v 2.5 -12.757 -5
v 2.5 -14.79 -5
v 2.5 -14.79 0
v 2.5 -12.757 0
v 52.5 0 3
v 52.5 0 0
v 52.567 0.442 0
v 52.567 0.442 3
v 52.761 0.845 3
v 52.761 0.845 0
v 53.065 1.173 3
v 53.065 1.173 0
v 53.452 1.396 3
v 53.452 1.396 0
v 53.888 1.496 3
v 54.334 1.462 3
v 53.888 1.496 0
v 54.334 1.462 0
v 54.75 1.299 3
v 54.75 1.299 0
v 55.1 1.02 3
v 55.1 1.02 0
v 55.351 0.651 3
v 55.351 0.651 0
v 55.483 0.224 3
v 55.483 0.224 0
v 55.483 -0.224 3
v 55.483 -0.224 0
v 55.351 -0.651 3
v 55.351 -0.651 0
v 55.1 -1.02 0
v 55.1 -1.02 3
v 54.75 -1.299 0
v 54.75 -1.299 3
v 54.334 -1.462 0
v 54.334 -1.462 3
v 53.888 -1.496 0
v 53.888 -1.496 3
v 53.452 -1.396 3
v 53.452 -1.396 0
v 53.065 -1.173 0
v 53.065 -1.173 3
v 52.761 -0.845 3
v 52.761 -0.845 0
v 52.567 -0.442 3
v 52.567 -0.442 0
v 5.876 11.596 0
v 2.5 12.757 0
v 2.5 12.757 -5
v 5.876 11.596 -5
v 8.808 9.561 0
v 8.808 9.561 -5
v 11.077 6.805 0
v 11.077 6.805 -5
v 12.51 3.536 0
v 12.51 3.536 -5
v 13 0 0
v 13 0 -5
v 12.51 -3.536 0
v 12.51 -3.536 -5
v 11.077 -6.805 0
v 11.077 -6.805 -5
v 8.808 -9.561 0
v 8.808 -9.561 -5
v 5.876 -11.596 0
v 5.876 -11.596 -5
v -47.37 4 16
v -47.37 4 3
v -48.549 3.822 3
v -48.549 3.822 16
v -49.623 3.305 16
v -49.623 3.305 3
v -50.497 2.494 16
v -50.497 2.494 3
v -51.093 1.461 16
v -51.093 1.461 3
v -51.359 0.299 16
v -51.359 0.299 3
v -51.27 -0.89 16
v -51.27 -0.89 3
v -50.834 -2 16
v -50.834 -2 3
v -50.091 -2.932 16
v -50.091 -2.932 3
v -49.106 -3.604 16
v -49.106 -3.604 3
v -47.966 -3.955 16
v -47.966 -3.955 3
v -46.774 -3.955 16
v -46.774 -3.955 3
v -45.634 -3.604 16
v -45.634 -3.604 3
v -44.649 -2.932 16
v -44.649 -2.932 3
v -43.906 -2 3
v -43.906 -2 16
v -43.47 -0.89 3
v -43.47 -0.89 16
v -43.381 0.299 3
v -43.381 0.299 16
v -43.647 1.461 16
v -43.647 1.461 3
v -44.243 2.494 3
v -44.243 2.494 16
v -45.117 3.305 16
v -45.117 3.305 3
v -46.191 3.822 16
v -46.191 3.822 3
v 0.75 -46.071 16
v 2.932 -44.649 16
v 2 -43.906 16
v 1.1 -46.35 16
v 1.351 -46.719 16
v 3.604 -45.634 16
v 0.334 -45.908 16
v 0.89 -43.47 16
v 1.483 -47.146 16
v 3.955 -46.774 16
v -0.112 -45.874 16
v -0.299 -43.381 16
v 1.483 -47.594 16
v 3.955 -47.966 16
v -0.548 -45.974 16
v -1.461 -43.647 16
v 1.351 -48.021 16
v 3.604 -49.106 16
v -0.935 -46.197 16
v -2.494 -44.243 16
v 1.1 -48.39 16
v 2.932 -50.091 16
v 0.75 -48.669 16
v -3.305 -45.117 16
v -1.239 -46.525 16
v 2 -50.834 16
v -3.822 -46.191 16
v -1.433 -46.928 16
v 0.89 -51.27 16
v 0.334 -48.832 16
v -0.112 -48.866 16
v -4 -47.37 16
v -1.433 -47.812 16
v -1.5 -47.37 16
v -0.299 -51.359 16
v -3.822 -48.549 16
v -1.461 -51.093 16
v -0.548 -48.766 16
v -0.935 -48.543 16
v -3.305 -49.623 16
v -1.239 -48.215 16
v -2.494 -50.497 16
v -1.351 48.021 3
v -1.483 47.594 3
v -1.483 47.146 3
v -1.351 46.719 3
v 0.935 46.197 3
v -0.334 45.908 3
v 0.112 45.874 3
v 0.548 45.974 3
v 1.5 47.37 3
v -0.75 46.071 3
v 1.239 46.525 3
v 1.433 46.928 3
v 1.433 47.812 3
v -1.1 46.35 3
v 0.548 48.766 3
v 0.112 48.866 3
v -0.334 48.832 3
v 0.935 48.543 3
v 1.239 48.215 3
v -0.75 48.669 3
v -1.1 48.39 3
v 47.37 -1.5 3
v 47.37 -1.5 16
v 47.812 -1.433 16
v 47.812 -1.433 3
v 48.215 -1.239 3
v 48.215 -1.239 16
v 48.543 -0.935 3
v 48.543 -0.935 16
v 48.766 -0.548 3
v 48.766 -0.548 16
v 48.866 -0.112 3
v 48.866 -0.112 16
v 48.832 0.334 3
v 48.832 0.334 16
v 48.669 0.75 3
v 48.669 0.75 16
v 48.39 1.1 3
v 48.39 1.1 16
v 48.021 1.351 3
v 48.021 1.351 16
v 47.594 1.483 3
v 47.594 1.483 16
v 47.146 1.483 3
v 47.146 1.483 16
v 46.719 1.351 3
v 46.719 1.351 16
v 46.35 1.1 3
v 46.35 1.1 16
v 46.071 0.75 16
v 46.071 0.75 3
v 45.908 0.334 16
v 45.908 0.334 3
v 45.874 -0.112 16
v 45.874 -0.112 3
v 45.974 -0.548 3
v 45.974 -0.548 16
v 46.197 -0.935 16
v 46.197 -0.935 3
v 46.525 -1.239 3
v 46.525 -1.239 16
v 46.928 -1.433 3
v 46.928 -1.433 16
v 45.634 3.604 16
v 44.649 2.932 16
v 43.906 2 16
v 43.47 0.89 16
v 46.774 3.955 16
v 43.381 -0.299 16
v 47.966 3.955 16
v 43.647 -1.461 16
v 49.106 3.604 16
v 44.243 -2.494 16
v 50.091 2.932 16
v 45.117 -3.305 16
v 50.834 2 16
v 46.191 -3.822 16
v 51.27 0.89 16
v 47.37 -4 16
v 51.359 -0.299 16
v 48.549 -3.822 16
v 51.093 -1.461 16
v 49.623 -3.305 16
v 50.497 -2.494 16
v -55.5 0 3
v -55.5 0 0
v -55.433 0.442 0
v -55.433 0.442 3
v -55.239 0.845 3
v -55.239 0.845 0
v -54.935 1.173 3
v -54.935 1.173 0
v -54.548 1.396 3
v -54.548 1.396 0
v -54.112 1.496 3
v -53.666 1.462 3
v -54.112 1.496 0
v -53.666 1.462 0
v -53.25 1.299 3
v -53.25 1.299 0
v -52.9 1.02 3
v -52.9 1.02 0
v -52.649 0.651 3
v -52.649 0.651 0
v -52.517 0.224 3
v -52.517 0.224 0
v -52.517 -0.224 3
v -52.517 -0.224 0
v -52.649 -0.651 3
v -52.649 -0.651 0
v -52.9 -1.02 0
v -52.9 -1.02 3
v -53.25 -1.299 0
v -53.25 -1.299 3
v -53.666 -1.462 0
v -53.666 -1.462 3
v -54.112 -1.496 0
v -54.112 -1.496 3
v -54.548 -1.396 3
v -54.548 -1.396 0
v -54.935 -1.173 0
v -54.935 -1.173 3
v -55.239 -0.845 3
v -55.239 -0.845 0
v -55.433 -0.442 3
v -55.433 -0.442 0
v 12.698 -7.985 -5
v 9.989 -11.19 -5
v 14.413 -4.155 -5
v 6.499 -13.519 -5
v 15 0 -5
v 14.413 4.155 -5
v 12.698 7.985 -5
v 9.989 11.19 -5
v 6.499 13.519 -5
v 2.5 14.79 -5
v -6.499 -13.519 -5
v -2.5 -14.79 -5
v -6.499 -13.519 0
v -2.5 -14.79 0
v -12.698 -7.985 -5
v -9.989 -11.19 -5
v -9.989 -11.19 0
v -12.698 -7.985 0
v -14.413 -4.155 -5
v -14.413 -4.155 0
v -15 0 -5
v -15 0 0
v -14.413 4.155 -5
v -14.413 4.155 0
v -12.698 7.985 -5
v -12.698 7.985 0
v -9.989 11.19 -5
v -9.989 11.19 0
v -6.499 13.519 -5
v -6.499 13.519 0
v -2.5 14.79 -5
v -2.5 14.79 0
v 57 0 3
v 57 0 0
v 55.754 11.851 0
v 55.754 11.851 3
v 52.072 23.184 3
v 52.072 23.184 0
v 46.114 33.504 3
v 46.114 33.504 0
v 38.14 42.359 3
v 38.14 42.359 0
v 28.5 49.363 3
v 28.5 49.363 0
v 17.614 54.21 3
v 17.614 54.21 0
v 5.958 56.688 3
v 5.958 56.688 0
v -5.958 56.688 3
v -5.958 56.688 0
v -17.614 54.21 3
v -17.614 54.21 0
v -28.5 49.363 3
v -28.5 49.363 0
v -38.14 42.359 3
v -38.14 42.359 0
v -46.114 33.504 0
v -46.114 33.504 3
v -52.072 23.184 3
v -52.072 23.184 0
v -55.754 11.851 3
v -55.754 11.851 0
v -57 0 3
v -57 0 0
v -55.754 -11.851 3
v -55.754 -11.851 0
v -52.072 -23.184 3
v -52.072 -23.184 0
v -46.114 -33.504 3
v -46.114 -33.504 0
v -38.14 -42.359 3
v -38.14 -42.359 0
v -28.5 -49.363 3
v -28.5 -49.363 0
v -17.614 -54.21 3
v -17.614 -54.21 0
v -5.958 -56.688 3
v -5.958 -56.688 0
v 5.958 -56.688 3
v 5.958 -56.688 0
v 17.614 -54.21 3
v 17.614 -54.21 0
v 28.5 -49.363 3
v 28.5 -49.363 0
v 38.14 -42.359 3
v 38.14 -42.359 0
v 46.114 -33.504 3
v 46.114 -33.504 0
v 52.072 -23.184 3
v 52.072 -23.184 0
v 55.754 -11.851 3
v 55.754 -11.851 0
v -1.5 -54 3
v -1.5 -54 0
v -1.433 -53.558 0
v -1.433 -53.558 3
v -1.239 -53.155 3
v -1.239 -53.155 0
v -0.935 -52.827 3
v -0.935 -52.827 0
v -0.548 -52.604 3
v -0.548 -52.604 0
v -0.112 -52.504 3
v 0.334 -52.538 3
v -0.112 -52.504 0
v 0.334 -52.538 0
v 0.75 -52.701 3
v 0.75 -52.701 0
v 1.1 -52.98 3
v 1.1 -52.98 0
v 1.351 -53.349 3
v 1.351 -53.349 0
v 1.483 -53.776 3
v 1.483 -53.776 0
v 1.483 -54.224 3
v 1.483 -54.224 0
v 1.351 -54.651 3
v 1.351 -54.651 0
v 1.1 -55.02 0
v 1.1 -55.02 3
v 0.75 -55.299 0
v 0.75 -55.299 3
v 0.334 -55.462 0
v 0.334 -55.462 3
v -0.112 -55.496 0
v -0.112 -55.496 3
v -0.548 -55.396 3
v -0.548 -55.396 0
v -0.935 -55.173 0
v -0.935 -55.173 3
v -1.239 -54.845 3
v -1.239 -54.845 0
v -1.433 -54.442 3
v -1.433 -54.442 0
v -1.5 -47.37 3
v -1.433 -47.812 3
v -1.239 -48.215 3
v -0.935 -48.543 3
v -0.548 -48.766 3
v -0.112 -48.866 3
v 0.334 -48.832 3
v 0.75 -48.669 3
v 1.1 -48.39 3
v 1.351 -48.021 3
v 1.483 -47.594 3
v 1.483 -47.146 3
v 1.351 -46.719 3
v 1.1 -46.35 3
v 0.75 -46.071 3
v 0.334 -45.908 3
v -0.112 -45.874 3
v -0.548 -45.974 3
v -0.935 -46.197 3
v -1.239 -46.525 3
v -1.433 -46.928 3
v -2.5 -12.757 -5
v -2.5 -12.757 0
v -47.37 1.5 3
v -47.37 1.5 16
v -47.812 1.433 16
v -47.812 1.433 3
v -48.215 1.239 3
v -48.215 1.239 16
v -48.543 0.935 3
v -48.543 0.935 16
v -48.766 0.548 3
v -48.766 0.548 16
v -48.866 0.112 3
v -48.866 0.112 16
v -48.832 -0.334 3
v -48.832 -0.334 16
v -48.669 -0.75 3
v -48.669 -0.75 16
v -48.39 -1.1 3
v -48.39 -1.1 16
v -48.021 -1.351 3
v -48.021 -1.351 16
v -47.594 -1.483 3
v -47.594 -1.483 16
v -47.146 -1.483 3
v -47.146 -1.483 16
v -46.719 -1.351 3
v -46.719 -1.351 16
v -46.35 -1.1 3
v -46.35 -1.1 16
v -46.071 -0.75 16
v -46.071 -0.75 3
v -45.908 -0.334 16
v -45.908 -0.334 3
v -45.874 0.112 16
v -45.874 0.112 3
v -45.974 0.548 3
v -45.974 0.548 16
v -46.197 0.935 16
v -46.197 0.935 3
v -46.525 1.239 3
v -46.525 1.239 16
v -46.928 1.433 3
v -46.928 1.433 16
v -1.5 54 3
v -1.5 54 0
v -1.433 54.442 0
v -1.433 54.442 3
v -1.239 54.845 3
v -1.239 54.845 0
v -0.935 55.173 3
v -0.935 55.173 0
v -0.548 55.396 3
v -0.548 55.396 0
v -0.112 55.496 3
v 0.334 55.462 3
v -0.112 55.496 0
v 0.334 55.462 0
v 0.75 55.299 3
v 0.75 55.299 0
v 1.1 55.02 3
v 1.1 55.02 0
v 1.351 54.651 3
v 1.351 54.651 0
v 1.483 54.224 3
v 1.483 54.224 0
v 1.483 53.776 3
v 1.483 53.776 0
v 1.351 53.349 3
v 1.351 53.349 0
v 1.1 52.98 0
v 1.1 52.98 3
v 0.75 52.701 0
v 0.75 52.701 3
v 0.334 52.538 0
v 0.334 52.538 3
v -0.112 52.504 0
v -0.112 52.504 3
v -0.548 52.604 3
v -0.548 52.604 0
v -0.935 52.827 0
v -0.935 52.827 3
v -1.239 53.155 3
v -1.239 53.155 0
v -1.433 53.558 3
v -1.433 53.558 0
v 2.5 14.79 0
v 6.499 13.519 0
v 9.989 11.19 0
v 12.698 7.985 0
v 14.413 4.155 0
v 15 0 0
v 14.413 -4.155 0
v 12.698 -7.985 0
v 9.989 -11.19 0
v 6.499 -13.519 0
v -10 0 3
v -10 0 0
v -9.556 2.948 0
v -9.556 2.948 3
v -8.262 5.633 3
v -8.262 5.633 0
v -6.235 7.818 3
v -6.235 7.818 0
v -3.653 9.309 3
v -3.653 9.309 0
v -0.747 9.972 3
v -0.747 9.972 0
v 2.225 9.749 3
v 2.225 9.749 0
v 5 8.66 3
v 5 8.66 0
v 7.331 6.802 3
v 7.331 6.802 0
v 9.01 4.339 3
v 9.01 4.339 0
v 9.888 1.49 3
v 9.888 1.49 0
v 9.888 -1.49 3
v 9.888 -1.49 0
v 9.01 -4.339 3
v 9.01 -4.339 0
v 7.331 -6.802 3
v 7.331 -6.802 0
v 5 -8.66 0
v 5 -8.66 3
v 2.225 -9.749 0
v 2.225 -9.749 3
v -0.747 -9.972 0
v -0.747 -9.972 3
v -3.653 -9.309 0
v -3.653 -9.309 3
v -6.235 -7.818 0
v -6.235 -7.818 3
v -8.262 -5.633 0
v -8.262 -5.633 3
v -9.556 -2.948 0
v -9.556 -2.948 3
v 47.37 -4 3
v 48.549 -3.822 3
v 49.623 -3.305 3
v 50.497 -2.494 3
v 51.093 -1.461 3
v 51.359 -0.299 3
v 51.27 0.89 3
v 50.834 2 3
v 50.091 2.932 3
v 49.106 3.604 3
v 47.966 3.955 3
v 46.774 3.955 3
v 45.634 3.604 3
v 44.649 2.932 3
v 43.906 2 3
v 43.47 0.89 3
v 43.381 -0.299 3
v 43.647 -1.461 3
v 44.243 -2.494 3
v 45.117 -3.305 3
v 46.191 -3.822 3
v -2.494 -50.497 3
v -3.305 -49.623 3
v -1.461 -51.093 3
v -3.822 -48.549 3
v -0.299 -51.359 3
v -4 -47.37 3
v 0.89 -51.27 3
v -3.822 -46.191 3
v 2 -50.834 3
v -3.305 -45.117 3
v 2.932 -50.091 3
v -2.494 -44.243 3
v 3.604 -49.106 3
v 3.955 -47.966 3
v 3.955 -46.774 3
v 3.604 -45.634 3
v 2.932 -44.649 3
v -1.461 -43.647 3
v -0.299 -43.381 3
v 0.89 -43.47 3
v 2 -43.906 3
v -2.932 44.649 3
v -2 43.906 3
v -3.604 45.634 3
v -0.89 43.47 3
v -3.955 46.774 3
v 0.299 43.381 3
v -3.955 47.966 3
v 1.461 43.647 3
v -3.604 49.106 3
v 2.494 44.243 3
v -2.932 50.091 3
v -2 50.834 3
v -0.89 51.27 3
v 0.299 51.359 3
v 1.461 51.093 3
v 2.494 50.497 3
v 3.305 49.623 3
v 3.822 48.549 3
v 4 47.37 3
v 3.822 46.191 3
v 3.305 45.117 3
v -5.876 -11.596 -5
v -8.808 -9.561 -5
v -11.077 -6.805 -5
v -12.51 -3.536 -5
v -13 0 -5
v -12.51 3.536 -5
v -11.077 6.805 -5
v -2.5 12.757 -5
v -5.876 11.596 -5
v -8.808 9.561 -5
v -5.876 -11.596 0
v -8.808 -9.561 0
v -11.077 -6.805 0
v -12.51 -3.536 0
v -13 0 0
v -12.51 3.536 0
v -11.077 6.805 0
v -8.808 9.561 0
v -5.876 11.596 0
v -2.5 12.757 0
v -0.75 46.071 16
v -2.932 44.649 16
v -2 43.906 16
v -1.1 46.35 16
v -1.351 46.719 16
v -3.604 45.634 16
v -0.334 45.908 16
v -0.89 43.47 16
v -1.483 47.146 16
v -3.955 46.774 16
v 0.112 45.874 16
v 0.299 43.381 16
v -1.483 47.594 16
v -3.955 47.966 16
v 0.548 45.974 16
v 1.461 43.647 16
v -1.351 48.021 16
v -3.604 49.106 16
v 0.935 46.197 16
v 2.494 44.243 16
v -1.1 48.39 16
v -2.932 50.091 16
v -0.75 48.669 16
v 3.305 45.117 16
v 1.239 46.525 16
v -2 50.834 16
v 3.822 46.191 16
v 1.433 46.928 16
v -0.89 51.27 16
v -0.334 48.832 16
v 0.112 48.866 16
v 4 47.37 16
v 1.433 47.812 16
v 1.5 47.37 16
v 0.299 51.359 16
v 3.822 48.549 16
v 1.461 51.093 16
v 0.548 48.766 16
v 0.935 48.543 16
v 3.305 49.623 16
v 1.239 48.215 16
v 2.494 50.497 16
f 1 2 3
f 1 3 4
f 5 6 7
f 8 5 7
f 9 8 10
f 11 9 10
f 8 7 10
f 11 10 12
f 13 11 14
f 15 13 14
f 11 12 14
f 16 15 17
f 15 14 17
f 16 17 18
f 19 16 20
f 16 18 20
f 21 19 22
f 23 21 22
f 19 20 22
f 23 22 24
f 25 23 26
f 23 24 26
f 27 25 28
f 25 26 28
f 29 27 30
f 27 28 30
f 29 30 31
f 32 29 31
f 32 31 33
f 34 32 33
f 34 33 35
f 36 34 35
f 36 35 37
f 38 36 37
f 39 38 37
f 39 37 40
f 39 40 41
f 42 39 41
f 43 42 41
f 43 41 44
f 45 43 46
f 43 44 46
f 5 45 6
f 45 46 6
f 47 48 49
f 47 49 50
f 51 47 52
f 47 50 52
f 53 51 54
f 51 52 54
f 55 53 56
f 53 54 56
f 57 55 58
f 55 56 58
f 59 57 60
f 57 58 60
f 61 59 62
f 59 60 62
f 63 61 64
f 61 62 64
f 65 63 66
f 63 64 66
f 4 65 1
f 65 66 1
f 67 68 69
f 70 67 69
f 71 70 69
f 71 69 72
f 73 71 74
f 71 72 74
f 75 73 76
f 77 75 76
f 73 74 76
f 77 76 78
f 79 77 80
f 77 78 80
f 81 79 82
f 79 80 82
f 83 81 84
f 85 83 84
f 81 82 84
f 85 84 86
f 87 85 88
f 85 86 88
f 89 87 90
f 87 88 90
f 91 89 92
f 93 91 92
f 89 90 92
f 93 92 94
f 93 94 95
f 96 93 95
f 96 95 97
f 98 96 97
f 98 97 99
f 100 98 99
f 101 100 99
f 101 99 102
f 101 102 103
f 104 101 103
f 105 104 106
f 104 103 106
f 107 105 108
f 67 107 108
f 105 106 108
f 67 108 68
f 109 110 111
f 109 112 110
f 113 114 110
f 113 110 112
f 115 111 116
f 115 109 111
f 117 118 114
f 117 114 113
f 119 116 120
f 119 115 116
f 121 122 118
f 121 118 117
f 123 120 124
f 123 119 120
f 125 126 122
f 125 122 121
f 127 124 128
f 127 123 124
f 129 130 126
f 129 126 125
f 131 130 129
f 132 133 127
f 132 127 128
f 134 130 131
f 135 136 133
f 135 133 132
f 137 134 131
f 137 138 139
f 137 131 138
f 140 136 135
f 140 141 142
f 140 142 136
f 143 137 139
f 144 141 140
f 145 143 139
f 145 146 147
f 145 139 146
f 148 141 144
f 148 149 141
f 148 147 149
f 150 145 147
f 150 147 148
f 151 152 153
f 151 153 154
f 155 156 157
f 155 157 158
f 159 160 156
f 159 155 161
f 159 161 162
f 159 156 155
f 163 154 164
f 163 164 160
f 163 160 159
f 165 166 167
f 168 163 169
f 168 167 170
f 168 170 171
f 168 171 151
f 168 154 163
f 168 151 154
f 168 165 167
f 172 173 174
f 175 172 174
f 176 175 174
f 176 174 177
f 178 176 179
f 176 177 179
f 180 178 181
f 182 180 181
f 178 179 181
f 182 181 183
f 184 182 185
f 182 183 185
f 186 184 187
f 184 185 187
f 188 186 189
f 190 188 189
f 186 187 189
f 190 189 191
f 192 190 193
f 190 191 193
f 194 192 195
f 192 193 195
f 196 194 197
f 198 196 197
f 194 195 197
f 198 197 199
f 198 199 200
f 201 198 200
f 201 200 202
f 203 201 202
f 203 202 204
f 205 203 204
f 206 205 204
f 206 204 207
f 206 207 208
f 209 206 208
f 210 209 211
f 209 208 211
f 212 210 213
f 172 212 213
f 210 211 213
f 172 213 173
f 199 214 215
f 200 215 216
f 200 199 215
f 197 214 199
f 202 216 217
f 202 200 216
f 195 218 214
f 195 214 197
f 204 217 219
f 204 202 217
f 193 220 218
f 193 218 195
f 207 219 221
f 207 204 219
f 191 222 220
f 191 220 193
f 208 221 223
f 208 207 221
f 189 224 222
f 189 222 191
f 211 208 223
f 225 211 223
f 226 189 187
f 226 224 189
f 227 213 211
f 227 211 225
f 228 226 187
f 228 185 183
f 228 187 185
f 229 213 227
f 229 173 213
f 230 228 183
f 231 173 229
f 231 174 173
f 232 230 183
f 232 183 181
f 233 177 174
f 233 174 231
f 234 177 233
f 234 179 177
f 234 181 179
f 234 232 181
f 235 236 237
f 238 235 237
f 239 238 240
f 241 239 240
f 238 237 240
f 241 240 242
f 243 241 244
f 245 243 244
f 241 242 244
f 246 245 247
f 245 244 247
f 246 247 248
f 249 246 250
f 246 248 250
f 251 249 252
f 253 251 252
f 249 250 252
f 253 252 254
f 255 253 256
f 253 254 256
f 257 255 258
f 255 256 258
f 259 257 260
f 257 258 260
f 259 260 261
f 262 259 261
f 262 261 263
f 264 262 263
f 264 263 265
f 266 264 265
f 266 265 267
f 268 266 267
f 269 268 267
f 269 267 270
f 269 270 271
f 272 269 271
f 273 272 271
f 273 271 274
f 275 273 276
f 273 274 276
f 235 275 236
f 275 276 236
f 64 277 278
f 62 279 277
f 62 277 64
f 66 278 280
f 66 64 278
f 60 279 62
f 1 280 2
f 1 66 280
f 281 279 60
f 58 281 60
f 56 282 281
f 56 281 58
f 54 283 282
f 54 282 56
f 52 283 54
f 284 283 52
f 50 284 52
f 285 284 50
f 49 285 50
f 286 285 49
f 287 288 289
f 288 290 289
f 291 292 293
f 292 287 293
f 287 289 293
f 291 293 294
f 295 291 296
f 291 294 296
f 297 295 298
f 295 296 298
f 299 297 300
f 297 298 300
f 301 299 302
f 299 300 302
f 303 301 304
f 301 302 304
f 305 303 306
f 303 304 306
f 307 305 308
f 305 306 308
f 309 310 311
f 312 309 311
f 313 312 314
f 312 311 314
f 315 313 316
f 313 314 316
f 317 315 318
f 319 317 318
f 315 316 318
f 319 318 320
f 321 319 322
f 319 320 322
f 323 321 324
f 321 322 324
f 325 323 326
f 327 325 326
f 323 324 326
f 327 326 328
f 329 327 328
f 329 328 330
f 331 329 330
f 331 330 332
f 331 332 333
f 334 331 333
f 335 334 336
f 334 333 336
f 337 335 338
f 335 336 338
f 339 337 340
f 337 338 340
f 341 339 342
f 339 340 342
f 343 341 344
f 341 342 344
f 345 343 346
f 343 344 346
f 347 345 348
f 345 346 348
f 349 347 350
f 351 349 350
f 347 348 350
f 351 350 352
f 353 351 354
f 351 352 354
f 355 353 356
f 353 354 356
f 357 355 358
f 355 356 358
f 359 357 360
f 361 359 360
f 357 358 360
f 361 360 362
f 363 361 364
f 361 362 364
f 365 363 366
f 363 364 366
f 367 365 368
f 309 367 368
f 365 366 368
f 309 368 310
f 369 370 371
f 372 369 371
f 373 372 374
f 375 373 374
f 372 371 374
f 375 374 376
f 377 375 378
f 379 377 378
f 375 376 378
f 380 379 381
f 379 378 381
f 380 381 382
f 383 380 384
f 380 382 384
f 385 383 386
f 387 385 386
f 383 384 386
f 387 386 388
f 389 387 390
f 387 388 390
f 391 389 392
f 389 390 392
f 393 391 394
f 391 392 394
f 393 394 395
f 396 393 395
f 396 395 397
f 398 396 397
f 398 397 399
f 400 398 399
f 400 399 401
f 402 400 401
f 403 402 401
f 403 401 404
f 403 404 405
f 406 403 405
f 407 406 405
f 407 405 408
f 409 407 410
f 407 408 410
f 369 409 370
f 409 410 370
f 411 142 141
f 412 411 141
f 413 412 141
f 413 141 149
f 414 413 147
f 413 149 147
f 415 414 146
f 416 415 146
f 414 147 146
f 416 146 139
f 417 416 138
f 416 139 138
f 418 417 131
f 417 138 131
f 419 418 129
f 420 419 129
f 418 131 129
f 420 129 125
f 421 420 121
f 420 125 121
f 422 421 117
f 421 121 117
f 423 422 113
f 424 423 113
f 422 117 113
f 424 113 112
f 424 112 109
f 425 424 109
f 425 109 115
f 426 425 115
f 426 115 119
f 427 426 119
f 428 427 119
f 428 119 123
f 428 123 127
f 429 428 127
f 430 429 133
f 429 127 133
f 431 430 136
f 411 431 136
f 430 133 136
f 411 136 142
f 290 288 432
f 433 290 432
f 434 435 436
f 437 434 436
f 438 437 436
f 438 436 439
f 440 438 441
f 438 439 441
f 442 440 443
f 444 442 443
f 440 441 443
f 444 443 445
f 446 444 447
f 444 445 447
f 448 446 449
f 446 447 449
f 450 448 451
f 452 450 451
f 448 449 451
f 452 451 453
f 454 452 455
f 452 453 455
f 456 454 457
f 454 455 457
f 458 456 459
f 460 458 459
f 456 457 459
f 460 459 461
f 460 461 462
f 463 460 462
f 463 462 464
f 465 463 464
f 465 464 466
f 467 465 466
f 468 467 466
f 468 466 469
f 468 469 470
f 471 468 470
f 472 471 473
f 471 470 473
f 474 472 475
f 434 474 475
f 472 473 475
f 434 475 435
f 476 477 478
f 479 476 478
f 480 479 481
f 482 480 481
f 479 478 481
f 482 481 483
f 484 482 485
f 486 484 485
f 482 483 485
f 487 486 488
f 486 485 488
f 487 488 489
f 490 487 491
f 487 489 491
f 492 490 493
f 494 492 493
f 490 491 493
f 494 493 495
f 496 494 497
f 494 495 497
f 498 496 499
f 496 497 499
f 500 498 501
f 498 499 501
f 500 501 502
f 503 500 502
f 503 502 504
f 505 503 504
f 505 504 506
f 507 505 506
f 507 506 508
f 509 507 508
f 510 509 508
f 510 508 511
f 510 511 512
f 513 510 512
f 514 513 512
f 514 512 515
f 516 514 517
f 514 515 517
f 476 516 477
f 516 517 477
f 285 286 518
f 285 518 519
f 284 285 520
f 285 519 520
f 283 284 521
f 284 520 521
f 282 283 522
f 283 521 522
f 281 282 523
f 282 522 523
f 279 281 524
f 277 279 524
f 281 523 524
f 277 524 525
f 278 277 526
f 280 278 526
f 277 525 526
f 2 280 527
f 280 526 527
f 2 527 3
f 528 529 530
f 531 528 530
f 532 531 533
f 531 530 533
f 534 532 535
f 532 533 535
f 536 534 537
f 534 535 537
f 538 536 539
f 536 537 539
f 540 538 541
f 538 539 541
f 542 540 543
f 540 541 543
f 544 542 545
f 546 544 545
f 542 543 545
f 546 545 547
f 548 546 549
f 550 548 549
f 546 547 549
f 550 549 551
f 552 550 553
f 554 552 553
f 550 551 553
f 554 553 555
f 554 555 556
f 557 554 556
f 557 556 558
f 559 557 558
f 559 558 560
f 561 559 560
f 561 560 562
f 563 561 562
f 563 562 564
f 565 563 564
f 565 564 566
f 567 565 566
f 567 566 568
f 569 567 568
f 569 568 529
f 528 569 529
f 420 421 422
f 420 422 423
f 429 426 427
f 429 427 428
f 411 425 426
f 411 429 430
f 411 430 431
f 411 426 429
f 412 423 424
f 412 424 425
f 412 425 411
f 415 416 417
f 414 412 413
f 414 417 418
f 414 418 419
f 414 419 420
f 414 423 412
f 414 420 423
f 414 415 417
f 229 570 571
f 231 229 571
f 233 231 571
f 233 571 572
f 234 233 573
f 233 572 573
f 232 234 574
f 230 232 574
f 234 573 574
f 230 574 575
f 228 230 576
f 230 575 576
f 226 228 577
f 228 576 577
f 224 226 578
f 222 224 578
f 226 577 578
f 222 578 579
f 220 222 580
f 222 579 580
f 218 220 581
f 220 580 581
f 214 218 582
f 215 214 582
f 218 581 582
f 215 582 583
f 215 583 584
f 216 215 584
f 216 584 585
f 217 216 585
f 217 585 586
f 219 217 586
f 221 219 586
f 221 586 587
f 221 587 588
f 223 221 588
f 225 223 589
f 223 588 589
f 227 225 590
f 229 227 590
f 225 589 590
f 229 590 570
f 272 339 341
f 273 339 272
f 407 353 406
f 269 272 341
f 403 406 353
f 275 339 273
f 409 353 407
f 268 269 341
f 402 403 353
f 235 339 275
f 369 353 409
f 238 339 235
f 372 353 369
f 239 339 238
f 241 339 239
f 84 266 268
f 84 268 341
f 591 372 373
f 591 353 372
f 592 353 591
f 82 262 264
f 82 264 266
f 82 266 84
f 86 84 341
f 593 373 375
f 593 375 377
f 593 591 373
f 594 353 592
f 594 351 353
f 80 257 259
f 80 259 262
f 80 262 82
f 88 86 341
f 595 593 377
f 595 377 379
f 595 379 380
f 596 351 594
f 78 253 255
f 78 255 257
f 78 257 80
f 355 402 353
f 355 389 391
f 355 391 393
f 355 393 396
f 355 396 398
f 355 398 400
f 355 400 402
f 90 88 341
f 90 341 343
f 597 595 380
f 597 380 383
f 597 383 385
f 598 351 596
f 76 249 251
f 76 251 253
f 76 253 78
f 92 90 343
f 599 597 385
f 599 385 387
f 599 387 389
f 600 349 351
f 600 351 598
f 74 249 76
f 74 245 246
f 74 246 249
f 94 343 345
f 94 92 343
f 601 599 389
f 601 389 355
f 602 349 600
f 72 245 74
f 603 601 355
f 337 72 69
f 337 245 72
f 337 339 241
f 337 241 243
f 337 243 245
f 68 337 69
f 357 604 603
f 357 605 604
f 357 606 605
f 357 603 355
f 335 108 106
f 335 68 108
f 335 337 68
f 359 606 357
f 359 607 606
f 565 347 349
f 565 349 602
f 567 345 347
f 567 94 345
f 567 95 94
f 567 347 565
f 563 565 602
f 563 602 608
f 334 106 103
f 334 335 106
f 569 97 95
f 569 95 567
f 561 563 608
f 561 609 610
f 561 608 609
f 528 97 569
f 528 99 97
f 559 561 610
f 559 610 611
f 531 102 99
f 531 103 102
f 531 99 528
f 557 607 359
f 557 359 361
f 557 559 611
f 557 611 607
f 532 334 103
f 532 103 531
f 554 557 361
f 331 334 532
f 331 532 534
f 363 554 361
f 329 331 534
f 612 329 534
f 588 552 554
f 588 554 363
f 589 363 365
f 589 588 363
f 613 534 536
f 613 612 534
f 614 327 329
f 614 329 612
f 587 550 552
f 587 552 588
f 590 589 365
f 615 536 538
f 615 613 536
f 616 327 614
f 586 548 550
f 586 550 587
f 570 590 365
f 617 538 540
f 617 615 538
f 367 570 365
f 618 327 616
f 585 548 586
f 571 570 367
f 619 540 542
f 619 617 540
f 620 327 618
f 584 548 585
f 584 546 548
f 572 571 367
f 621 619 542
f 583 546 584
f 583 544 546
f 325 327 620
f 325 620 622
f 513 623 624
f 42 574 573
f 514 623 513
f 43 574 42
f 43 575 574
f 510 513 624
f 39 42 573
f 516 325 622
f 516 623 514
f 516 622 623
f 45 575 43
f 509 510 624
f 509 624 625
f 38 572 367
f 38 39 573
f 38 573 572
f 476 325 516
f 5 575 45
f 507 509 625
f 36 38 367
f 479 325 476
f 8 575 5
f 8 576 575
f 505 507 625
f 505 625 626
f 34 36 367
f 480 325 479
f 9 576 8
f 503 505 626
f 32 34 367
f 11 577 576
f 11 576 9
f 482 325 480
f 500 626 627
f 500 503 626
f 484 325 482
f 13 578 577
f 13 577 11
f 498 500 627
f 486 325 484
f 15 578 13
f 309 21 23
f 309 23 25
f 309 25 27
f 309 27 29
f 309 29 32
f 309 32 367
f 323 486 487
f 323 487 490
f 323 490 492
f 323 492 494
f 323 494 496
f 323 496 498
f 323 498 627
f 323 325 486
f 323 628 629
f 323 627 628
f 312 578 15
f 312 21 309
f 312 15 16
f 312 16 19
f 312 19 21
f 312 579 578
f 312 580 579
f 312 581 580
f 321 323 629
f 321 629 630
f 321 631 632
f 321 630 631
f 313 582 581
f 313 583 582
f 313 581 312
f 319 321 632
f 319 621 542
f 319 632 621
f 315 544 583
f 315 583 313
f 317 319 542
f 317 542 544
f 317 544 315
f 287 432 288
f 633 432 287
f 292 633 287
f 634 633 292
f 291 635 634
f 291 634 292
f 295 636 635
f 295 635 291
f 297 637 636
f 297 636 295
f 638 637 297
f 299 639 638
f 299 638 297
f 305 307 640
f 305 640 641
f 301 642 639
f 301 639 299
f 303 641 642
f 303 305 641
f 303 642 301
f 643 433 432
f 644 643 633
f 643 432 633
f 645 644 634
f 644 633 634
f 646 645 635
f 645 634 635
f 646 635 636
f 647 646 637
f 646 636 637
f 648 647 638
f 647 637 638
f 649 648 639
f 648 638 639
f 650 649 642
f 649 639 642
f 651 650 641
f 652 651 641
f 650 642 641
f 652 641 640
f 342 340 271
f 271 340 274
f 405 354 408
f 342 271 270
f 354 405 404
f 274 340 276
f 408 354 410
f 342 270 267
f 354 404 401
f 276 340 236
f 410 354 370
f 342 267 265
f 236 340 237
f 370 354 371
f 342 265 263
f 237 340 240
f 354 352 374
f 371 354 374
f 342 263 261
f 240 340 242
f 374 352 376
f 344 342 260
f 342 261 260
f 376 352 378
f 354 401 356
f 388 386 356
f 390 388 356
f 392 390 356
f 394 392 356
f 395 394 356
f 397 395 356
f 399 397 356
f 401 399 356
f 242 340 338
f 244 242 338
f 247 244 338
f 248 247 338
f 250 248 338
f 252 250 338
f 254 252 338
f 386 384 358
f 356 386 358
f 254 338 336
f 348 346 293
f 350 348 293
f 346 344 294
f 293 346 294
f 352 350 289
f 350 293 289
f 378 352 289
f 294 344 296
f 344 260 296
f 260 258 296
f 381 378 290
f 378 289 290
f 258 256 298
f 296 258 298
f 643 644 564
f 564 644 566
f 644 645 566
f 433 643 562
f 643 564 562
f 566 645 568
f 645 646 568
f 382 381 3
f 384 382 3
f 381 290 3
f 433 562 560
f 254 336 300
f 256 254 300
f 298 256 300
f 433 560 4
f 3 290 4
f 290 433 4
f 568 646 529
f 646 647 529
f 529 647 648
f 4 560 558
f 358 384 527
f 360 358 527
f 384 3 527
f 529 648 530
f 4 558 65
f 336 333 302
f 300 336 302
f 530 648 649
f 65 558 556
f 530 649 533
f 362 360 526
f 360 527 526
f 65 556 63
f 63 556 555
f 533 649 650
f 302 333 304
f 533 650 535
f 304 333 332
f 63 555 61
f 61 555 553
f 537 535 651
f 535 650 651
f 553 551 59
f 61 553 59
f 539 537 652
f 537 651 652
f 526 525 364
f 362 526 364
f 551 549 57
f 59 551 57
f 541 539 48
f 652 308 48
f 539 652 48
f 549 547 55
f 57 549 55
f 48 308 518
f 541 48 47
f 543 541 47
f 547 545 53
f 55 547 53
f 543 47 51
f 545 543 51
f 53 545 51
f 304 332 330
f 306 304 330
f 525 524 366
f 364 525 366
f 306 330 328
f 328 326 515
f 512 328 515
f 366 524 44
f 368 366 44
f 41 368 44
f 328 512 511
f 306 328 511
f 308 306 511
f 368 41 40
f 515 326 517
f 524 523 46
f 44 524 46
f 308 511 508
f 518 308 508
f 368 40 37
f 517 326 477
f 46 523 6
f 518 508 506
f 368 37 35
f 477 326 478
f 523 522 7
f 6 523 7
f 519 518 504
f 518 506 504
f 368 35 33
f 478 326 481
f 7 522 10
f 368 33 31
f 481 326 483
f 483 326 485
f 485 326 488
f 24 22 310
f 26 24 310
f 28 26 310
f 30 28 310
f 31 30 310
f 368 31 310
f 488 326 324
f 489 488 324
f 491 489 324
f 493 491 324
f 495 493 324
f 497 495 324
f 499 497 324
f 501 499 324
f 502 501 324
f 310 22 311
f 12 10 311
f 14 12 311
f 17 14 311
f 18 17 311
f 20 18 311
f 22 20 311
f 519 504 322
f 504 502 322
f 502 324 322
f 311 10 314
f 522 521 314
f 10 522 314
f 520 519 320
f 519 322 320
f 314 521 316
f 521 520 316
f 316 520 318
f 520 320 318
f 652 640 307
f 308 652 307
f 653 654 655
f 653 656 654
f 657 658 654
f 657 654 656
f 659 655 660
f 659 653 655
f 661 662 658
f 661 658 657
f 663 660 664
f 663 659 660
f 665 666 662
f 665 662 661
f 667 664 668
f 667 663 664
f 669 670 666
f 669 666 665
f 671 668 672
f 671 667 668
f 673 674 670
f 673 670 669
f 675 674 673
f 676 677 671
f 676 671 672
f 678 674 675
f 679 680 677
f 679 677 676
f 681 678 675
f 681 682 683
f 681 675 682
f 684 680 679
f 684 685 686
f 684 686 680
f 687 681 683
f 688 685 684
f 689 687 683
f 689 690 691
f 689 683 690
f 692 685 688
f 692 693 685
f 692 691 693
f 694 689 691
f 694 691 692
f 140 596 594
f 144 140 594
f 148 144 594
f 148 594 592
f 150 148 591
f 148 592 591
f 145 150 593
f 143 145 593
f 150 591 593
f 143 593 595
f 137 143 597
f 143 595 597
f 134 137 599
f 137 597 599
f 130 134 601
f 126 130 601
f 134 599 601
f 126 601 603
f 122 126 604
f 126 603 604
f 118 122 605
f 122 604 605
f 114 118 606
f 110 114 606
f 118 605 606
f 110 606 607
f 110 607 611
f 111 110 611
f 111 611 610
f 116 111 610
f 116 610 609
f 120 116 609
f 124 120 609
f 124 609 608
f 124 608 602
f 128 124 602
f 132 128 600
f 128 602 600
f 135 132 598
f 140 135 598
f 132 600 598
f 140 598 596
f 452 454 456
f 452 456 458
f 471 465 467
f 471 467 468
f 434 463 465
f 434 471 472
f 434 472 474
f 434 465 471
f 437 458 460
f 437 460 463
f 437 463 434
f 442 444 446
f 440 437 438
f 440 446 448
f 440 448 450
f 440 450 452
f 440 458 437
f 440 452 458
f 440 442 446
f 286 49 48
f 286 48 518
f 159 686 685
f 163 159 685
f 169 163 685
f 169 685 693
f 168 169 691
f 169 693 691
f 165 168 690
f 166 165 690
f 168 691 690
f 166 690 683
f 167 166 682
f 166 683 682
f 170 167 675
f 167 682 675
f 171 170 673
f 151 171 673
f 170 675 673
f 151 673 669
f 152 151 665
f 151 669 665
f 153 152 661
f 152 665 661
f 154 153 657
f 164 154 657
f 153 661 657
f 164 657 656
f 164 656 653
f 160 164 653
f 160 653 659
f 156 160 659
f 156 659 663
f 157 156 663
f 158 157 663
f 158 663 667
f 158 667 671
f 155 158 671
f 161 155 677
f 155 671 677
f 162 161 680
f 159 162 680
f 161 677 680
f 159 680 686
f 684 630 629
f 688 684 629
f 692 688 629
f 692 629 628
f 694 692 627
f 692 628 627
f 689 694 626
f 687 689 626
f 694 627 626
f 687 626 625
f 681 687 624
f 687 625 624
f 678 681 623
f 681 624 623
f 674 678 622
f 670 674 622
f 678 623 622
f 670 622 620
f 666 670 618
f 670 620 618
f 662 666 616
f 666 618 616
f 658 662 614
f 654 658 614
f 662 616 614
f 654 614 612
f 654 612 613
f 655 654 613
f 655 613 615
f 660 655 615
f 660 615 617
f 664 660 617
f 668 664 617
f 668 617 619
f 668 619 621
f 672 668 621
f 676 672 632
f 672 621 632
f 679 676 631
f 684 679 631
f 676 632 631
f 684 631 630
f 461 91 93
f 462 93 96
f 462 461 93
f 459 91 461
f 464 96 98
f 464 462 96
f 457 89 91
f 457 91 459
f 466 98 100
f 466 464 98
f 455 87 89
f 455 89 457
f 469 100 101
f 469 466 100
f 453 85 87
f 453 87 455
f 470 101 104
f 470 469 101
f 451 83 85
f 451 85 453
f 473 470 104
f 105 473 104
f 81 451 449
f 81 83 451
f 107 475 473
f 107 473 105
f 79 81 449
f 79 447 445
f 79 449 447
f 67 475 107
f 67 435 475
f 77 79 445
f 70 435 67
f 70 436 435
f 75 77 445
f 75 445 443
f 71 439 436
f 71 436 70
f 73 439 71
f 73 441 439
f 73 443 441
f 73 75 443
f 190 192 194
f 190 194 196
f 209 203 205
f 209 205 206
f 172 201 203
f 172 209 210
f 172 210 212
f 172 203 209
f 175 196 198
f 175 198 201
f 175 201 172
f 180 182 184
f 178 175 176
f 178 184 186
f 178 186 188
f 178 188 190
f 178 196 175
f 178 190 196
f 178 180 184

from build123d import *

# Parameters (mm, degrees)
SKETCH1_R           = 57
BOSS_EXTRUDE1_DEPTH = 3
SKETCH2_R           = 15
BOSS_EXTRUDE2_DEPTH = 5
SKETCH3_R           = 13
CUT_EXTRUDE1_DEPTH  = 5
SKETCH4_R           = 10
CUT_EXTRUDE2_DEPTH  = 3
SKETCH6_W           = 5
SKETCH6_H           = 50
CUT_EXTRUDE4_DEPTH  = 5
SKETCH8_R           = 1.5
CUT_EXTRUDE5_DEPTH  = 3
SKETCH9_R           = 4
BOSS_EXTRUDE4_DEPTH = 13
SKETCH11_R          = 1.5
CUT_EXTRUDE6_DEPTH  = 13
CIRPATTERN1_COUNT   = 4


with BuildPart() as part:
    # Sketch1 → Boss-Extrude1 (new body)
    with BuildSketch(Plane.XY):
        Circle(SKETCH1_R)
    extrude(amount=BOSS_EXTRUDE1_DEPTH)

    # Sketch2 → Boss-Extrude2 (add)
    with BuildSketch(Plane(origin=(0, 0, 0), x_dir=(-1, 0, 0), z_dir=(0, 0, -1))):
        Circle(SKETCH2_R)
    extrude(amount=BOSS_EXTRUDE2_DEPTH)

    # Sketch3 → Cut-Extrude1 (cut)
    with BuildSketch(Plane(origin=(0, 0, -5), x_dir=(-1, 0, 0), z_dir=(0, 0, -1))):
        Circle(SKETCH3_R)
    extrude(amount=-CUT_EXTRUDE1_DEPTH, mode=Mode.SUBTRACT)

    # Sketch4 → Cut-Extrude2 (cut)
    with BuildSketch(Plane(origin=(0, 0, 0), x_dir=(-1, 0, 0), z_dir=(0, 0, -1))):
        Circle(SKETCH4_R)
    extrude(amount=-CUT_EXTRUDE2_DEPTH, mode=Mode.SUBTRACT)

    # Sketch6 → Cut-Extrude4 (cut)
    with BuildSketch(Plane(origin=(0, 0, -5), x_dir=(-1, 0, 0), z_dir=(0, 0, -1))):
        Rectangle(SKETCH6_W, SKETCH6_H)
    extrude(amount=-CUT_EXTRUDE4_DEPTH, mode=Mode.SUBTRACT)

    # Sketch8 → Cut-Extrude5 (cut)
    with BuildSketch(Plane(origin=(0, 0, 0), x_dir=(-1, 0, 0), z_dir=(0, 0, -1))):
        with Locations((0, 54)):
            Circle(SKETCH8_R)
        with Locations((54, 0)):
            Circle(SKETCH8_R)
        with Locations((0, -54)):
            Circle(SKETCH8_R)
        with Locations((-54, 0)):
            Circle(SKETCH8_R)
    extrude(amount=-CUT_EXTRUDE5_DEPTH, mode=Mode.SUBTRACT)

    # Sketch9 → Boss-Extrude4 (add)
    with BuildSketch(Plane.XY.offset(3)):
        with Locations((0, 47.37)):
            Circle(SKETCH9_R)
    boss_extrude4 = extrude(amount=BOSS_EXTRUDE4_DEPTH)

    # Sketch11 → Cut-Extrude6 (cut)
    with BuildSketch(Plane.XY.offset(16)):
        with Locations((0, 47.37)):
            Circle(SKETCH11_R)
    cut_extrude6 = extrude(amount=-CUT_EXTRUDE6_DEPTH, mode=Mode.SUBTRACT)

    # CirPattern1: Boss-Extrude4, Cut-Extrude6 ×4 about axis
    cirpattern1_axis = Axis((0, 0, 0), (0, 0, 1))
    for i in range(1, CIRPATTERN1_COUNT):
        add(boss_extrude4.rotate(cirpattern1_axis, i * 360 / CIRPATTERN1_COUNT))
        add(cut_extrude6.rotate(cirpattern1_axis, i * 360 / CIRPATTERN1_COUNT), mode=Mode.SUBTRACT)


solid = part.part
